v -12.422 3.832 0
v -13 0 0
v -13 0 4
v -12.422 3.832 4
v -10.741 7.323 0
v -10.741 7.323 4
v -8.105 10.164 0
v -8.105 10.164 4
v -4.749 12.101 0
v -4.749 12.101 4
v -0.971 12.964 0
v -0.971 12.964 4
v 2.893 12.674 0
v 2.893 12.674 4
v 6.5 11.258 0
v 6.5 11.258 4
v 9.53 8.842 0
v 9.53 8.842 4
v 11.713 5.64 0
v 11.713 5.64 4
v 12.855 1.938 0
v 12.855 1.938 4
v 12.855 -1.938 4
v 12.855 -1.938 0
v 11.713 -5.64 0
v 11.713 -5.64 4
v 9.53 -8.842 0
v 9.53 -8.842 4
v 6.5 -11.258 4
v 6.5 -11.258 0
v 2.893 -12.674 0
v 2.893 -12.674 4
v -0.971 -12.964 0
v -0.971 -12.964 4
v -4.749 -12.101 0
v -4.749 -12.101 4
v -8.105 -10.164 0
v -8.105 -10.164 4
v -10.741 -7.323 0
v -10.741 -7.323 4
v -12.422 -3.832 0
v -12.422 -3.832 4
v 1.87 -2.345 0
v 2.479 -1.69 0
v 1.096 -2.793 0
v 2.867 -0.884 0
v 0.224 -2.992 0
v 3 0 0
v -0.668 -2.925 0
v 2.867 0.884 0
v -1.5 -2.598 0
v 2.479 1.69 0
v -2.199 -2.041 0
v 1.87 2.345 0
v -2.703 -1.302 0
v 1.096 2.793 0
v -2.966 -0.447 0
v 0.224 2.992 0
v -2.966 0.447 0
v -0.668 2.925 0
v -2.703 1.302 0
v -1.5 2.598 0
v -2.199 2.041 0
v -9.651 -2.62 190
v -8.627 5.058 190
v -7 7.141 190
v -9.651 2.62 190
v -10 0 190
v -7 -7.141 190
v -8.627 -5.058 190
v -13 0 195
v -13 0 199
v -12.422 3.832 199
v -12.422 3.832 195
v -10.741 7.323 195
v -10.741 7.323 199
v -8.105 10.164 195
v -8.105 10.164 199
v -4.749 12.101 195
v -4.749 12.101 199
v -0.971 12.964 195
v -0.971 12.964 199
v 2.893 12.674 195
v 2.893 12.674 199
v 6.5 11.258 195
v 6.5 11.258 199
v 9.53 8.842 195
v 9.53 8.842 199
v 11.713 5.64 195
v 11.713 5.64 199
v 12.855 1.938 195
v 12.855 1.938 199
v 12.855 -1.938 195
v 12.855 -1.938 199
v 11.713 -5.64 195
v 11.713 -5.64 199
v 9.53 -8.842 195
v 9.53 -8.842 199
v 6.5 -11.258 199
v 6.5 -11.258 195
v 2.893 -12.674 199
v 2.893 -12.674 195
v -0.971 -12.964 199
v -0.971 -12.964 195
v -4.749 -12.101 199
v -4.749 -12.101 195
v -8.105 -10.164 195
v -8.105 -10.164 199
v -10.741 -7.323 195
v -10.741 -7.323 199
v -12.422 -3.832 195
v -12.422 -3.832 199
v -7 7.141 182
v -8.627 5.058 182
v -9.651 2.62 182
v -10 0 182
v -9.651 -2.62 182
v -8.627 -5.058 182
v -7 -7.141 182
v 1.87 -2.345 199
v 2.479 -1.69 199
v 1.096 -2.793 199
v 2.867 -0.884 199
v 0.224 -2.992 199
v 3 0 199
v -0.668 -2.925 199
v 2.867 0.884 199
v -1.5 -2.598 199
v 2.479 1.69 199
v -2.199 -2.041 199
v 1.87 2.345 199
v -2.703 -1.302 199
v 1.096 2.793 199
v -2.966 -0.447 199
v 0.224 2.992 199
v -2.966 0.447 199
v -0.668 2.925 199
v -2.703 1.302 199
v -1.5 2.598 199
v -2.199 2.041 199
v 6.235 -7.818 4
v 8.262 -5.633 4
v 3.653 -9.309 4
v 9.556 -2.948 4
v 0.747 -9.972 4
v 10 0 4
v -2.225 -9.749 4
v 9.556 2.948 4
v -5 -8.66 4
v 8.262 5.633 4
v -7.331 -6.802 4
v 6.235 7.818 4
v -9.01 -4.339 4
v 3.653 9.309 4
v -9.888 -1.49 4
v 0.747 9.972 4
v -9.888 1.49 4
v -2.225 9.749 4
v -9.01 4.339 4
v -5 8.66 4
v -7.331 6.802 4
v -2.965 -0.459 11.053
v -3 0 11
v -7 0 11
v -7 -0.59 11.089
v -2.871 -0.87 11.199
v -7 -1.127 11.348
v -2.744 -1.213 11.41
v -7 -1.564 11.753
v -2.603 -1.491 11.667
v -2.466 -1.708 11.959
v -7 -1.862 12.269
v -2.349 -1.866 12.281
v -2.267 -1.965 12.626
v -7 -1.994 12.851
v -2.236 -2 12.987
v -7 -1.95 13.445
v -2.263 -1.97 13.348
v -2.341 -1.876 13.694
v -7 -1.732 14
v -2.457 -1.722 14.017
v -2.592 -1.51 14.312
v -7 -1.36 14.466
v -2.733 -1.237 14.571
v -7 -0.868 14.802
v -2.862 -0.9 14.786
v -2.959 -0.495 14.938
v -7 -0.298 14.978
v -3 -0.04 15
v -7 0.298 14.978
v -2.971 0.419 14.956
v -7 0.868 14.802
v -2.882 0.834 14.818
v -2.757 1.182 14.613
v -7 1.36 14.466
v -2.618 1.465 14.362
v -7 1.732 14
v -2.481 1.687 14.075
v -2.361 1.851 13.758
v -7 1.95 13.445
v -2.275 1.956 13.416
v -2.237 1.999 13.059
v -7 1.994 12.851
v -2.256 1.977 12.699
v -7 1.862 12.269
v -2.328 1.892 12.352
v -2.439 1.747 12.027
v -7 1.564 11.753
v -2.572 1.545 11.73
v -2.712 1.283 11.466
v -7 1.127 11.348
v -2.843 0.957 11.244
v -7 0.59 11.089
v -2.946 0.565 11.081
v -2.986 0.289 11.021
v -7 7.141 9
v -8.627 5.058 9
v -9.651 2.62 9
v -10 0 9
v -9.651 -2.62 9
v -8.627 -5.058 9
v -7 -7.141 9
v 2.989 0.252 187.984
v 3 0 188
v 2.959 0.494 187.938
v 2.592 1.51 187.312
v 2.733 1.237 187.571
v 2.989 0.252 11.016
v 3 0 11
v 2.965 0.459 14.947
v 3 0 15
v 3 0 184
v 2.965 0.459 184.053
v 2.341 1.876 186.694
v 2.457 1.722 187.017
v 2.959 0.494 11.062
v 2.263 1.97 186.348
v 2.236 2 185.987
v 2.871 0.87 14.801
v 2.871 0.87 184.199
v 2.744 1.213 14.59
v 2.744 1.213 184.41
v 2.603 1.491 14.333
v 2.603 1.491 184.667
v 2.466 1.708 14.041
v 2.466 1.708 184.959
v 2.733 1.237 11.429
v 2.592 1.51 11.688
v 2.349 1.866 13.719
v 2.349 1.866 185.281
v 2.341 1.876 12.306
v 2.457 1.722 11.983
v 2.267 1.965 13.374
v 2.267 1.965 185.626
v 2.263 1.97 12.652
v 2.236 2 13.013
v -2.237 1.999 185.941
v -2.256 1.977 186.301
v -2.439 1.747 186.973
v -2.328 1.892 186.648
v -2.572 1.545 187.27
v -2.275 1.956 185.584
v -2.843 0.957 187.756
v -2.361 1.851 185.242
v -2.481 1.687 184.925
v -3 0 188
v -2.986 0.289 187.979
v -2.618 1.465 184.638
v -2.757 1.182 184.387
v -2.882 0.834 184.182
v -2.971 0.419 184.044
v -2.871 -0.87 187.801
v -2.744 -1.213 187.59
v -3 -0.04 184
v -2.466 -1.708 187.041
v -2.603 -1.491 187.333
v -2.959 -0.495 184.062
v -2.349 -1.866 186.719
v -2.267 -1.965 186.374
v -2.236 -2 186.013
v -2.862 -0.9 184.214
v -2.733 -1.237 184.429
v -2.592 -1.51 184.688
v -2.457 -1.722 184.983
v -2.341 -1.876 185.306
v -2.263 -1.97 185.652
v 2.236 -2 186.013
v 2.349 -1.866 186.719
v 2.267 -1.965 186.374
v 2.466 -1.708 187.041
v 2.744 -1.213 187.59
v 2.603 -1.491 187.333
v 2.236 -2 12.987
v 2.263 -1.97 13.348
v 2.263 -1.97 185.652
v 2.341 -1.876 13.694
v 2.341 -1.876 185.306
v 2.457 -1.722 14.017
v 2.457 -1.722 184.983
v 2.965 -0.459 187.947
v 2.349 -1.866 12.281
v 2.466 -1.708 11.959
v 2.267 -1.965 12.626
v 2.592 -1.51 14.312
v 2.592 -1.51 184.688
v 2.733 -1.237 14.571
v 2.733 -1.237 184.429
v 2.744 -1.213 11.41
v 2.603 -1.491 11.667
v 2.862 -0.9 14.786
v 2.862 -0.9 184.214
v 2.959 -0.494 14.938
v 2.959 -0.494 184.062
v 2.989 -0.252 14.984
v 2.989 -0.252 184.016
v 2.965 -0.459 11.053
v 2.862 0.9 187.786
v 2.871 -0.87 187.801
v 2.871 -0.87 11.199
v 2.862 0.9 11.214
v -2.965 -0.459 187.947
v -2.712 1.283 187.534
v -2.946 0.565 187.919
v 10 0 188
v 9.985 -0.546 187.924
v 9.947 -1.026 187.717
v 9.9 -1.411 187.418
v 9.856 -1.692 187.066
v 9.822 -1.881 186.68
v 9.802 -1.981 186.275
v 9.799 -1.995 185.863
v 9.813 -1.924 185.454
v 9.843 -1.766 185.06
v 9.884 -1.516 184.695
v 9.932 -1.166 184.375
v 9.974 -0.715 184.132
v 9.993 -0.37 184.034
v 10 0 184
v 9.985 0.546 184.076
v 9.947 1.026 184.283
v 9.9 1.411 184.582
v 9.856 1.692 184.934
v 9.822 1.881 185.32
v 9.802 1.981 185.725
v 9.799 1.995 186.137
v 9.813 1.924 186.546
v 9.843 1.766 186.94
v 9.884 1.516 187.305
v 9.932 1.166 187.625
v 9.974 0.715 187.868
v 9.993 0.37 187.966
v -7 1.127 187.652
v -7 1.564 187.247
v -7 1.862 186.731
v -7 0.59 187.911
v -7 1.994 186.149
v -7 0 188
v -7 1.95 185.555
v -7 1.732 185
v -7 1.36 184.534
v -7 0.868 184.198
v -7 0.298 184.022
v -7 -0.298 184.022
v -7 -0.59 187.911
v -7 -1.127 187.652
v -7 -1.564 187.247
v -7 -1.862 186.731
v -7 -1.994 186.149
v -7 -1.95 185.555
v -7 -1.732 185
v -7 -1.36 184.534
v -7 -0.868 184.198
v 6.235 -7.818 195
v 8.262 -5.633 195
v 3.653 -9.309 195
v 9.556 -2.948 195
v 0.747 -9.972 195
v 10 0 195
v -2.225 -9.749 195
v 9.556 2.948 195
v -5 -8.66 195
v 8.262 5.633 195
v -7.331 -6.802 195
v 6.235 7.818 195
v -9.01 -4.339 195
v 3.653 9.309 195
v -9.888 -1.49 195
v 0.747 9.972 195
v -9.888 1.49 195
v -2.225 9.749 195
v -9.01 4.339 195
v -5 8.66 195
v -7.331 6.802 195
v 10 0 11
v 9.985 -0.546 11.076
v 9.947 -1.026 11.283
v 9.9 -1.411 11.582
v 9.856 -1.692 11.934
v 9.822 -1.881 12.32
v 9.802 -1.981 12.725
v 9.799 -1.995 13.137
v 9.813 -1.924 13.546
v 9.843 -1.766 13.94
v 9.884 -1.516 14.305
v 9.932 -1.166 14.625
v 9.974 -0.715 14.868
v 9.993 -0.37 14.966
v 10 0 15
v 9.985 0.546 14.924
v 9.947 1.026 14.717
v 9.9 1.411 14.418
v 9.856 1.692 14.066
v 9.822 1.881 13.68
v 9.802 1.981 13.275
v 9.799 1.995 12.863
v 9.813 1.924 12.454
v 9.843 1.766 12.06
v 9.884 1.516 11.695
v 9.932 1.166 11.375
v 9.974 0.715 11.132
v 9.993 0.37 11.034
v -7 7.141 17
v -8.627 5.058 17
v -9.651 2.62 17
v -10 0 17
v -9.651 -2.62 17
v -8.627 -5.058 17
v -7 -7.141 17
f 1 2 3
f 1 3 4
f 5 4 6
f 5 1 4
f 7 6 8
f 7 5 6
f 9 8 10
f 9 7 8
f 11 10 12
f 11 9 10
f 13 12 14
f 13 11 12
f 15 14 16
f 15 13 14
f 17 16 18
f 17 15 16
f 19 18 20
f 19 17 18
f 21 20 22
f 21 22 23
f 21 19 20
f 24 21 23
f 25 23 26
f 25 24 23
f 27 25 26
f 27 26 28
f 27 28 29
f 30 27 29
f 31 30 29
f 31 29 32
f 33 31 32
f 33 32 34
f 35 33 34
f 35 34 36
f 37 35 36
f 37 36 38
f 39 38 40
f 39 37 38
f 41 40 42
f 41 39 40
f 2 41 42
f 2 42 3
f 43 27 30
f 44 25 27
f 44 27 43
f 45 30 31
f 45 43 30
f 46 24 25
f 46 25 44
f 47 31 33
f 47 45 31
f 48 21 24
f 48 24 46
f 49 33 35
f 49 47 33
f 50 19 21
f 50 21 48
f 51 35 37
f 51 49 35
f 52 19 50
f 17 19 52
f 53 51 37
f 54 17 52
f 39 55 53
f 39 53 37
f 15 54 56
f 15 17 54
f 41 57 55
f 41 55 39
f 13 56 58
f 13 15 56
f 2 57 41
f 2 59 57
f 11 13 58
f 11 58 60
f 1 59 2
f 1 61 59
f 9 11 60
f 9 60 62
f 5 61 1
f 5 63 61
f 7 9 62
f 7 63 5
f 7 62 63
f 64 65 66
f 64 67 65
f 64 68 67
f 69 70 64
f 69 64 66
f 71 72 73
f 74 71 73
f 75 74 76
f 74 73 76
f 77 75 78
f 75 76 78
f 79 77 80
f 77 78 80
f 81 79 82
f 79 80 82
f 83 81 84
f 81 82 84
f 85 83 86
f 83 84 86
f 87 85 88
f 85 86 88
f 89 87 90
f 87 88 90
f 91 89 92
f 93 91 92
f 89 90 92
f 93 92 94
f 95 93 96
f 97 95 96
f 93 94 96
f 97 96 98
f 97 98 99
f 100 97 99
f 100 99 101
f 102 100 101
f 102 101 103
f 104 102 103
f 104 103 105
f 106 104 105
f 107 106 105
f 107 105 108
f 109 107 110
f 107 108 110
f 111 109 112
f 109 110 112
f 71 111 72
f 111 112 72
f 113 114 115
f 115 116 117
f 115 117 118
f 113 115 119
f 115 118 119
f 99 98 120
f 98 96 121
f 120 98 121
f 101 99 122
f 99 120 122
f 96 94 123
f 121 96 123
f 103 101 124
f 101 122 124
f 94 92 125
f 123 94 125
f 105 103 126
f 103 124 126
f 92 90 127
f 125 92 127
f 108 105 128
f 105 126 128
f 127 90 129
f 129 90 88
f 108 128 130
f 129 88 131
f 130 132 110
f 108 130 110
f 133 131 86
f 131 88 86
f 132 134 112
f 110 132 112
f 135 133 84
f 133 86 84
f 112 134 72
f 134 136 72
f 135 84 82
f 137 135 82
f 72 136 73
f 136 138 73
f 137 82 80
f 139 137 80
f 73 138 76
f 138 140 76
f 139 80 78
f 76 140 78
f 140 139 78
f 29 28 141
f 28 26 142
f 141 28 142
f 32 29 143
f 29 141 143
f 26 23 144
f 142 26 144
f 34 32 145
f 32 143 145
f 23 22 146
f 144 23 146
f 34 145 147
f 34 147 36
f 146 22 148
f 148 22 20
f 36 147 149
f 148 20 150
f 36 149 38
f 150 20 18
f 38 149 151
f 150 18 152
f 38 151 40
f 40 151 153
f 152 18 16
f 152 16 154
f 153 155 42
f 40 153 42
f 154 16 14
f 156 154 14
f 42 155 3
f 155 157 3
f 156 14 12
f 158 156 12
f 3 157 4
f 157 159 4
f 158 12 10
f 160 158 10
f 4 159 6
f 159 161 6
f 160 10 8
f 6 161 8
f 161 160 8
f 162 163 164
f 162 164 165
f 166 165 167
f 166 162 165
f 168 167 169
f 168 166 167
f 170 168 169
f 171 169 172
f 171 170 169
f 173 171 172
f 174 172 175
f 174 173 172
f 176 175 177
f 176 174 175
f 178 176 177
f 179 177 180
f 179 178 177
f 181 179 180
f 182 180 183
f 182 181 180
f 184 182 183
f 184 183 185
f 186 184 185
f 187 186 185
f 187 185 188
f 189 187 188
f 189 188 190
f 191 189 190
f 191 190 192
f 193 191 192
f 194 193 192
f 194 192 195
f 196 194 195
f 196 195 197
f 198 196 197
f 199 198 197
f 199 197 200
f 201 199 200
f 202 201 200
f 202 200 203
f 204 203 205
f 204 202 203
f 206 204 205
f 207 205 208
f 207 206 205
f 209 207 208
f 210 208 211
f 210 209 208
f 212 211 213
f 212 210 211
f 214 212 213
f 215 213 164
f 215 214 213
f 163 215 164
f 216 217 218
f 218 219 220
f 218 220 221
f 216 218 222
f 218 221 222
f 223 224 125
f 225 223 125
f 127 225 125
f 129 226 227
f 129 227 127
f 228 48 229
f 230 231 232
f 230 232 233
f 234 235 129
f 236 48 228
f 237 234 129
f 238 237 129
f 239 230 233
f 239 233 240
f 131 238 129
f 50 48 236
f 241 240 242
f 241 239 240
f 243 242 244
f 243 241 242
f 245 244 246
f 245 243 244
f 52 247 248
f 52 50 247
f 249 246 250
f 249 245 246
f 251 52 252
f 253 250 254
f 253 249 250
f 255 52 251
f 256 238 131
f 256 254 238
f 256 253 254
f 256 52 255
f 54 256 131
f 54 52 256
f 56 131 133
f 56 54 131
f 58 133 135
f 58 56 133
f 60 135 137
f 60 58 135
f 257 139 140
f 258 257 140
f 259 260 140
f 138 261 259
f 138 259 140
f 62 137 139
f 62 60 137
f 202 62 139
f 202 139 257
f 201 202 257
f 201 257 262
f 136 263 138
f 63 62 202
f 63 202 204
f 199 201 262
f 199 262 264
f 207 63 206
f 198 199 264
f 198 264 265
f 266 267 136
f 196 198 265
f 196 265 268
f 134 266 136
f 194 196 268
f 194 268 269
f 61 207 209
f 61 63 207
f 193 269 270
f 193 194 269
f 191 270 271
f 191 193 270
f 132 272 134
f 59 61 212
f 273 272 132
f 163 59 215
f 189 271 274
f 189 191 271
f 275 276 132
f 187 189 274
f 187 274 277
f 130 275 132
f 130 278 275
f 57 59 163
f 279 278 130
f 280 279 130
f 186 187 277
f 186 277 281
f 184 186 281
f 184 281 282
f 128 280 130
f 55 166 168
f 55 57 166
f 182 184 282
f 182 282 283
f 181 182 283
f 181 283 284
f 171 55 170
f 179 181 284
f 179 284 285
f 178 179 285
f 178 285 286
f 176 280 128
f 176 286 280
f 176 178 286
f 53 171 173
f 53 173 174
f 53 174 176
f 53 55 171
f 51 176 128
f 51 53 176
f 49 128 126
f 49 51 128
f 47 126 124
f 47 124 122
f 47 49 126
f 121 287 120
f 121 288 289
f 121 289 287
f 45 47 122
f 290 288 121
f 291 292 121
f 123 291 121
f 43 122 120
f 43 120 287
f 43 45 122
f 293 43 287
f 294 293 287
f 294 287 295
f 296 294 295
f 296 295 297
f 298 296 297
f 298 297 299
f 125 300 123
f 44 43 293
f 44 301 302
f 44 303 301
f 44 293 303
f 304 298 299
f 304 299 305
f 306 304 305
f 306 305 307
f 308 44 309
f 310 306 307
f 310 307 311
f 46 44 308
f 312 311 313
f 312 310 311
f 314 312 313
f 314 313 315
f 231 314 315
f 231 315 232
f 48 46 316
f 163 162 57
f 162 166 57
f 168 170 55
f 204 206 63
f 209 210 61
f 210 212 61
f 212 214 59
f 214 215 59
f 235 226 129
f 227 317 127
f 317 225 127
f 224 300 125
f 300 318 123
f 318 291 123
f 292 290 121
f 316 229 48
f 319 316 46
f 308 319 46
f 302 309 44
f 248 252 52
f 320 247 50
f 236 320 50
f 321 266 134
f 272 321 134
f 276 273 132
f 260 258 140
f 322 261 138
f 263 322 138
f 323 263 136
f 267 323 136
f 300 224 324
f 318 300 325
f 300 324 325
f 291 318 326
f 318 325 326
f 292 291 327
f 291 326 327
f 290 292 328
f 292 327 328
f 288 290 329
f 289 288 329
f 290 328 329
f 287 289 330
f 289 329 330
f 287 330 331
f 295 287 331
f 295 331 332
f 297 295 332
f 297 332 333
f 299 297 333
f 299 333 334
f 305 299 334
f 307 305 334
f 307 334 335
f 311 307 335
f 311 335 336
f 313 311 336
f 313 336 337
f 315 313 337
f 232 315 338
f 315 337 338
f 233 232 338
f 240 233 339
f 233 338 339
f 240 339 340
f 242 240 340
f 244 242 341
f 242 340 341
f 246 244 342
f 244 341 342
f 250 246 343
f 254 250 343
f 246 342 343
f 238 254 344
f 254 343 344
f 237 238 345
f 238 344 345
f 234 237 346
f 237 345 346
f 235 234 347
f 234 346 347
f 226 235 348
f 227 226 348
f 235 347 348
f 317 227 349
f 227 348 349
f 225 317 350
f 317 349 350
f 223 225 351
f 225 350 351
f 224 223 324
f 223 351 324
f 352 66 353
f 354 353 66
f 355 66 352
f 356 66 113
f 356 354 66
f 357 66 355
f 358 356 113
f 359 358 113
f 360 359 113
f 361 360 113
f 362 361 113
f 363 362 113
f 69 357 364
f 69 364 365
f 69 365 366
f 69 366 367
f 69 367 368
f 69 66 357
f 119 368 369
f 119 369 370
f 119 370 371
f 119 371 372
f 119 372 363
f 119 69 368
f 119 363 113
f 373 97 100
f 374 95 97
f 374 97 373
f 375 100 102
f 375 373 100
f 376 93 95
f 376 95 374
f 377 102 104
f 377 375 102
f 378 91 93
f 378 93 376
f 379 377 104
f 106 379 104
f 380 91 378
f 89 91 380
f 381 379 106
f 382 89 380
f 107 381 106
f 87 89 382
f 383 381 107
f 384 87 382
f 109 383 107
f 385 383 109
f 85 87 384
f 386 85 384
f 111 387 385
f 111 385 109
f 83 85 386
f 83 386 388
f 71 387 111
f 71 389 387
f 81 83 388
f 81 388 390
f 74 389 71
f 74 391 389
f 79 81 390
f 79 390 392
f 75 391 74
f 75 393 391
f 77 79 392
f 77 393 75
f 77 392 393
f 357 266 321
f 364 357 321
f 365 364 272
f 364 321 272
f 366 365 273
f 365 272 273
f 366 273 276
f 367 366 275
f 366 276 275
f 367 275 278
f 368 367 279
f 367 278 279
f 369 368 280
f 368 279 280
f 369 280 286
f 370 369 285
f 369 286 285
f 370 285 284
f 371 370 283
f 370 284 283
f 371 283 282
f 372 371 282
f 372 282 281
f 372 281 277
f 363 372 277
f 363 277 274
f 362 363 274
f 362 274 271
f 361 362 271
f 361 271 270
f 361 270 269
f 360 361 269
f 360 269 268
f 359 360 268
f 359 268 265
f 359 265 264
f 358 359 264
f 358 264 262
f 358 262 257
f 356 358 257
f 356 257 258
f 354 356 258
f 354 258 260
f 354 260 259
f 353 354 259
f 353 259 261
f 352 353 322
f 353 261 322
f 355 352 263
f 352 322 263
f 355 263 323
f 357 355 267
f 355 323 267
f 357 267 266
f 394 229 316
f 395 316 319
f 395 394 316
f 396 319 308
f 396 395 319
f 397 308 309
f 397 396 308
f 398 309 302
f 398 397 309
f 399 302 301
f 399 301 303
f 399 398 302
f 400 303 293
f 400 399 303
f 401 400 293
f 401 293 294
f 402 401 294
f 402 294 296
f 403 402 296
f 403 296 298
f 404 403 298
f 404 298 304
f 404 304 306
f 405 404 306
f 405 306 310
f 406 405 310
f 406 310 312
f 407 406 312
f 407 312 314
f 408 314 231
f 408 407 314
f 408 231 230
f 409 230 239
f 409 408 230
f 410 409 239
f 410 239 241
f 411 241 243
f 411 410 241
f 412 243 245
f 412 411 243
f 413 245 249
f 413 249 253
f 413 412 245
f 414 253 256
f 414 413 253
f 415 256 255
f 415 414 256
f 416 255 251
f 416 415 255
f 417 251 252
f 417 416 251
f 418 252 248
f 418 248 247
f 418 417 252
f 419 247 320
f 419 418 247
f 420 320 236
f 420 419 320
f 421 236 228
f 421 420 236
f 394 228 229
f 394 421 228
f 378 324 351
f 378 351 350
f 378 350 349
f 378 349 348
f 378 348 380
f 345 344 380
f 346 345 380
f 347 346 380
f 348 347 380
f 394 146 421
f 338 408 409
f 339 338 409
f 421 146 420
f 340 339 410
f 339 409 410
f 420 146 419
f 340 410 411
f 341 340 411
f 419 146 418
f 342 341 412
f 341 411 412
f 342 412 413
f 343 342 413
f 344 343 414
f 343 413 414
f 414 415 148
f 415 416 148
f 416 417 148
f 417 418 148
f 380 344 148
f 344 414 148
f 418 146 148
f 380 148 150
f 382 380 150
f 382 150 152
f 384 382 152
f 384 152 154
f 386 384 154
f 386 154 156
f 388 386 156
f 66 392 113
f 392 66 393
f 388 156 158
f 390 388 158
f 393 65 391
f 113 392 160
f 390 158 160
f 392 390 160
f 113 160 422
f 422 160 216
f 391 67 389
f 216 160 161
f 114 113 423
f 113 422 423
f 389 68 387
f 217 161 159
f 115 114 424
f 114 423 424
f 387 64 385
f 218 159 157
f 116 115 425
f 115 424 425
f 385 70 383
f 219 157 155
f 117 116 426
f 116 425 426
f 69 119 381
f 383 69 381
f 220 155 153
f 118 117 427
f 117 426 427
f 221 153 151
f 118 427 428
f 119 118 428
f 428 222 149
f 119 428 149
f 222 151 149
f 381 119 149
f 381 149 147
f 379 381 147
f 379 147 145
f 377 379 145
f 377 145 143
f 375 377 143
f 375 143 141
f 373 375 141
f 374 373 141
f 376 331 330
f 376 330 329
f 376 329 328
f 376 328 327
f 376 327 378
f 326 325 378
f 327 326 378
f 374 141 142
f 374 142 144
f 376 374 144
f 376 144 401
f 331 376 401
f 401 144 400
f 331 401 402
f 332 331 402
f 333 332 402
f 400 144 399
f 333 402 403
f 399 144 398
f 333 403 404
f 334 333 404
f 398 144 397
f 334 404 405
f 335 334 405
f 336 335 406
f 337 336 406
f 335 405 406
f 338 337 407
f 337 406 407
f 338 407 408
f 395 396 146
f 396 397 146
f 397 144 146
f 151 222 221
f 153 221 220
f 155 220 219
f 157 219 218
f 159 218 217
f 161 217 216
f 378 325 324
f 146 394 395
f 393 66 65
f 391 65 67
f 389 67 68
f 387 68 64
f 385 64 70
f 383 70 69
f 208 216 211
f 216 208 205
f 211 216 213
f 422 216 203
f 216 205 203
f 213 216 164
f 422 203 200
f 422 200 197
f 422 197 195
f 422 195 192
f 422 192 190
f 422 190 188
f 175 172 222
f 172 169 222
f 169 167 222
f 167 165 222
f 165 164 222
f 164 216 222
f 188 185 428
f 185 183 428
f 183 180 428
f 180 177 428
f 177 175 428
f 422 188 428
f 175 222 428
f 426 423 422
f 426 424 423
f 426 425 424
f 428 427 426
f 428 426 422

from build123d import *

# Parameters (mm, degrees)
SKETCH1_R                       = 10
SKETCH1_R_2                     = 3
BOSS_EXTRUDE1_DEPTH             = 199
SKETCH2_R                       = 13
SKETCH2_R_2                     = 10
BOSS_EXTRUDE2_DEPTH             = 4
CUT_EXTRUDE1_START              = -25
SKETCH3_W                       = 3
SKETCH3_H                       = 8
CUT_EXTRUDE1_DEPTH              = 47
F_4_0MM_CLEARANCE_DOWEL_HOLE1_D = 4


with BuildPart() as part:
    # Sketch1 → Boss-Extrude1 (new body)
    with BuildSketch(Plane.XY):
        Circle(SKETCH1_R)
        Circle(SKETCH1_R_2, mode=Mode.SUBTRACT)
    extrude(amount=BOSS_EXTRUDE1_DEPTH)

    # Sketch2 → Boss-Extrude2 (add)
    with BuildSketch(Plane(origin=(0, 0, 0), x_dir=(-1, 0, 0), z_dir=(0, 0, -1))):
        Circle(SKETCH2_R)
        Circle(SKETCH2_R_2, mode=Mode.SUBTRACT)
    boss_extrude2 = extrude(amount=-BOSS_EXTRUDE2_DEPTH)

    # Mirror1: Boss-Extrude2 across plane
    add(boss_extrude2.mirror(Plane(origin=(0, 0, 99.5), x_dir=(1, 0, 0), z_dir=(0, 0, -1))))

    # Sketch3 → Cut-Extrude1 (cut)
    with BuildSketch(Plane(origin=(0, 0, 0), x_dir=(1, 0, 0), z_dir=(0, 1, 0)).offset(CUT_EXTRUDE1_START)):
        with Locations((-8.5, -186)):
            Rectangle(SKETCH3_W, SKETCH3_H)
    cut_extrude1 = extrude(amount=CUT_EXTRUDE1_DEPTH, mode=Mode.SUBTRACT)

    # Ø4.0mm Clearance Dowel Hole1 (through all)
    with Locations(Plane(origin=(-7, 0, 186), x_dir=(0, 0, -1), z_dir=(-1, 0, 0))):
        with Locations((0, 0)):
            f_4_0mm_clearance_dowel_hole1 = Hole(F_4_0MM_CLEARANCE_DOWEL_HOLE1_D / 2)

    # Mirror2: Cut-Extrude1, Ø4.0mm Clearance Dowel Hole1 across plane
    add(cut_extrude1.mirror(Plane(origin=(0, 0, 99.5), x_dir=(1, 0, 0), z_dir=(0, 0, -1))), mode=Mode.SUBTRACT)
    add(f_4_0mm_clearance_dowel_hole1.mirror(Plane(origin=(0, 0, 99.5), x_dir=(1, 0, 0), z_dir=(0, 0, -1))), mode=Mode.SUBTRACT)


solid = part.part
